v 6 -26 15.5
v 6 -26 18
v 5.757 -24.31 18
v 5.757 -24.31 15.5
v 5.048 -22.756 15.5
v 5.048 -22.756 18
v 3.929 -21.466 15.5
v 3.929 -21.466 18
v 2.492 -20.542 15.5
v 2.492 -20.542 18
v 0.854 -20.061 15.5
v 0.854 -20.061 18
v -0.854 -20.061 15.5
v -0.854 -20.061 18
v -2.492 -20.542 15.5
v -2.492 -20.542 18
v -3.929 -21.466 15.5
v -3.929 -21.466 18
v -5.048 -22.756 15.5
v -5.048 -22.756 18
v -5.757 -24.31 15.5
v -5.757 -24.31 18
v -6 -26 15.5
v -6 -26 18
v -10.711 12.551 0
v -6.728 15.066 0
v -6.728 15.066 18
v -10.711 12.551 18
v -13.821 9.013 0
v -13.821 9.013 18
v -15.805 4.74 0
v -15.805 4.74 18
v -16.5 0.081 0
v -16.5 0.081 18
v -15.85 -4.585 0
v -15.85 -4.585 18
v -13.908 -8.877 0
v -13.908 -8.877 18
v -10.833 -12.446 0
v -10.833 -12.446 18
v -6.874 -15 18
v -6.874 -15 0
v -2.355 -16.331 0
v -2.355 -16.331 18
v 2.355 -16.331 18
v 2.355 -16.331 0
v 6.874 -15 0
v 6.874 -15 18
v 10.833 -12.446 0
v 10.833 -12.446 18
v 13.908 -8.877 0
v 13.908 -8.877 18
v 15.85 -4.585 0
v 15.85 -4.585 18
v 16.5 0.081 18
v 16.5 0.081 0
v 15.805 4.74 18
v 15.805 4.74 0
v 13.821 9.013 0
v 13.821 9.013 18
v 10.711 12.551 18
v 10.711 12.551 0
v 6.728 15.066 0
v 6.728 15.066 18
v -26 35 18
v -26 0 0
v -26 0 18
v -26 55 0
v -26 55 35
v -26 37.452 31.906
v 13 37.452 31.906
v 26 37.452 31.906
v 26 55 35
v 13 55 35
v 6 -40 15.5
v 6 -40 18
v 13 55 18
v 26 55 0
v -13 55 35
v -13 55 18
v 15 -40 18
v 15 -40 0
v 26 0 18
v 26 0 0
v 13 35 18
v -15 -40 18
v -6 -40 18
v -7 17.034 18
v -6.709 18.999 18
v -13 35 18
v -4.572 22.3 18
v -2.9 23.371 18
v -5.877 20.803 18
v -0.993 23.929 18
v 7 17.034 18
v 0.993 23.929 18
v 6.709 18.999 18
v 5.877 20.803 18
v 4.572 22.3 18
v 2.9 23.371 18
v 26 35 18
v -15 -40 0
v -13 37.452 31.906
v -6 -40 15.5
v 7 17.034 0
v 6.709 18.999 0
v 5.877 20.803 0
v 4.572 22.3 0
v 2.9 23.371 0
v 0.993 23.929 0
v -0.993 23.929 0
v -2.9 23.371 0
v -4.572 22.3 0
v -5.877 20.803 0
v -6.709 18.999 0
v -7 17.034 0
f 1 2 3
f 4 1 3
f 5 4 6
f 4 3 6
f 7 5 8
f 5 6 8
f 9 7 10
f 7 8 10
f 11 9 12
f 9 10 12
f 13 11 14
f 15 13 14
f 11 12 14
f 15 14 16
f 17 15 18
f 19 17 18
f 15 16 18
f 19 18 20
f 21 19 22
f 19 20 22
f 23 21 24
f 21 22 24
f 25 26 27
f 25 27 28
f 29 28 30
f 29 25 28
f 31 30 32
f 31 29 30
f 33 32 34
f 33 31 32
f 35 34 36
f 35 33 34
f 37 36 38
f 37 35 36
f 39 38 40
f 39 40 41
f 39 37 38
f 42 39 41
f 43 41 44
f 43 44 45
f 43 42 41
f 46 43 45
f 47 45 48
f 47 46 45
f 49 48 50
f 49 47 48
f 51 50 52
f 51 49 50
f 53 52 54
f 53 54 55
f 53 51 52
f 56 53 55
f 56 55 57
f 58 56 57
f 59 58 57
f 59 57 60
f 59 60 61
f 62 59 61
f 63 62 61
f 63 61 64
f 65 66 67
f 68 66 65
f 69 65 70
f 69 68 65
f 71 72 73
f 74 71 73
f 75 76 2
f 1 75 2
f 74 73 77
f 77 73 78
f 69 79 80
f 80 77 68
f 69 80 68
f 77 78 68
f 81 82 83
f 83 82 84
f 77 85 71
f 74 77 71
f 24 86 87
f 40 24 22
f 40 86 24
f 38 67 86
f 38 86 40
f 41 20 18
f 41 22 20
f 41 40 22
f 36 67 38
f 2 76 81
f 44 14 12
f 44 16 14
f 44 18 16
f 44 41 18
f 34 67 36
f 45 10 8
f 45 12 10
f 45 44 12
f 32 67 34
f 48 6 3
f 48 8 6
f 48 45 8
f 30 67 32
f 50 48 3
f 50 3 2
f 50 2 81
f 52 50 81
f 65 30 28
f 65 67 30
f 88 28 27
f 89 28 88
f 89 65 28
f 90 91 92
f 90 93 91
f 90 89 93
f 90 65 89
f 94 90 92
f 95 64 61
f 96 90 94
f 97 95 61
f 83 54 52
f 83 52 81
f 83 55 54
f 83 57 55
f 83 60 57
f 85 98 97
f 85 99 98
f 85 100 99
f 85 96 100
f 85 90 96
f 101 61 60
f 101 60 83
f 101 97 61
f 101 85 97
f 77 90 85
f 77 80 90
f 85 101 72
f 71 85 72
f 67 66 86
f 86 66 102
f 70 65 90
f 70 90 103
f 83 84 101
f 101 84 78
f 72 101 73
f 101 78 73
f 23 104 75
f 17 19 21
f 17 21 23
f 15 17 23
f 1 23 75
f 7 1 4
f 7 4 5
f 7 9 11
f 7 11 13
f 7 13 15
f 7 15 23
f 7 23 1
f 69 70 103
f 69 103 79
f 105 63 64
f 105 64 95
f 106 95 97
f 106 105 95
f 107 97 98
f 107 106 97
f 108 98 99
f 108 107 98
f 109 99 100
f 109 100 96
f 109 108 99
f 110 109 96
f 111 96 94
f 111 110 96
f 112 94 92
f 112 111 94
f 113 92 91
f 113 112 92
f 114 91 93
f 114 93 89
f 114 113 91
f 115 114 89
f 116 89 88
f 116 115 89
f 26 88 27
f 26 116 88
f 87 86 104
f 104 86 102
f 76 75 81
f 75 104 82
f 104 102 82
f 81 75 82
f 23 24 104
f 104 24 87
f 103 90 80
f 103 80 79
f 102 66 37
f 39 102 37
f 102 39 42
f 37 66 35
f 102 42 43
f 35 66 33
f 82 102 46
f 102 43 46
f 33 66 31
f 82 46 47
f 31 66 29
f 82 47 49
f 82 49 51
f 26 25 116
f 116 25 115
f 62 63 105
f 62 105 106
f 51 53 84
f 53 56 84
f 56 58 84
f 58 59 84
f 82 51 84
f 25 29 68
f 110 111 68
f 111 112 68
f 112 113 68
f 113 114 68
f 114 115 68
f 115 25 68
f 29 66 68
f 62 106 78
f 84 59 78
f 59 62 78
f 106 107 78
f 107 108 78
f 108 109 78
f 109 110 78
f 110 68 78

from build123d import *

# Parameters (mm, degrees)
EXTRUDE_1_DEPTH     = 18
EXTRUDE_2_DEPTH     = 13
CUT_EXTRUDE_1_DEPTH = 2.5


with BuildPart() as part:
    # 草图1 → 凸台-拉伸1 (new body)
    with BuildSketch(Plane.XY):
        Polygon((-26, 0), (-15, -40), (15, -40), (26, 0), (26, 55), (-26, 55), align=None)
        with BuildLine():
            ThreePointArc((-6.727579547, 15.066176471), (0, -16.5), (6.727579547, 15.066176471))
            ThreePointArc((6.727579547, 15.066176471), (0, 24), (-6.727579547, 15.066176471))
        make_face(mode=Mode.SUBTRACT)
    extrude(amount=EXTRUDE_1_DEPTH)

    # 草图2 → 凸台-拉伸2 (add)
    with BuildSketch(Plane(origin=(26, 0, 0), x_dir=(0, 0, -1), z_dir=(1, 0, 0))):
        Polygon((-18, 55), (-18, 35), (-31.905808723, 37.451969267), (-35, 55), align=None)
    extrude_2 = extrude(amount=-EXTRUDE_2_DEPTH)

    # 镜向1: 凸台-拉伸2 across plane
    add(extrude_2.mirror(Plane(origin=(0, 0, 0), x_dir=(0, 0, 1), z_dir=(1, 0, 0))))

    # 草图3 → 切除-拉伸1 (cut, symmetric)
    with BuildSketch(Plane.XY.offset(18)):
        with BuildLine():
            Line((-6, -26), (-6, -55.48155058))
            Line((-6, -55.48155058), (6, -55.48155058))
            Line((6, -55.48155058), (6, -26))
            ThreePointArc((6, -26), (0, -20), (-6, -26))
        make_face()
    extrude(amount=CUT_EXTRUDE_1_DEPTH, both=True, mode=Mode.SUBTRACT)


solid = part.part
